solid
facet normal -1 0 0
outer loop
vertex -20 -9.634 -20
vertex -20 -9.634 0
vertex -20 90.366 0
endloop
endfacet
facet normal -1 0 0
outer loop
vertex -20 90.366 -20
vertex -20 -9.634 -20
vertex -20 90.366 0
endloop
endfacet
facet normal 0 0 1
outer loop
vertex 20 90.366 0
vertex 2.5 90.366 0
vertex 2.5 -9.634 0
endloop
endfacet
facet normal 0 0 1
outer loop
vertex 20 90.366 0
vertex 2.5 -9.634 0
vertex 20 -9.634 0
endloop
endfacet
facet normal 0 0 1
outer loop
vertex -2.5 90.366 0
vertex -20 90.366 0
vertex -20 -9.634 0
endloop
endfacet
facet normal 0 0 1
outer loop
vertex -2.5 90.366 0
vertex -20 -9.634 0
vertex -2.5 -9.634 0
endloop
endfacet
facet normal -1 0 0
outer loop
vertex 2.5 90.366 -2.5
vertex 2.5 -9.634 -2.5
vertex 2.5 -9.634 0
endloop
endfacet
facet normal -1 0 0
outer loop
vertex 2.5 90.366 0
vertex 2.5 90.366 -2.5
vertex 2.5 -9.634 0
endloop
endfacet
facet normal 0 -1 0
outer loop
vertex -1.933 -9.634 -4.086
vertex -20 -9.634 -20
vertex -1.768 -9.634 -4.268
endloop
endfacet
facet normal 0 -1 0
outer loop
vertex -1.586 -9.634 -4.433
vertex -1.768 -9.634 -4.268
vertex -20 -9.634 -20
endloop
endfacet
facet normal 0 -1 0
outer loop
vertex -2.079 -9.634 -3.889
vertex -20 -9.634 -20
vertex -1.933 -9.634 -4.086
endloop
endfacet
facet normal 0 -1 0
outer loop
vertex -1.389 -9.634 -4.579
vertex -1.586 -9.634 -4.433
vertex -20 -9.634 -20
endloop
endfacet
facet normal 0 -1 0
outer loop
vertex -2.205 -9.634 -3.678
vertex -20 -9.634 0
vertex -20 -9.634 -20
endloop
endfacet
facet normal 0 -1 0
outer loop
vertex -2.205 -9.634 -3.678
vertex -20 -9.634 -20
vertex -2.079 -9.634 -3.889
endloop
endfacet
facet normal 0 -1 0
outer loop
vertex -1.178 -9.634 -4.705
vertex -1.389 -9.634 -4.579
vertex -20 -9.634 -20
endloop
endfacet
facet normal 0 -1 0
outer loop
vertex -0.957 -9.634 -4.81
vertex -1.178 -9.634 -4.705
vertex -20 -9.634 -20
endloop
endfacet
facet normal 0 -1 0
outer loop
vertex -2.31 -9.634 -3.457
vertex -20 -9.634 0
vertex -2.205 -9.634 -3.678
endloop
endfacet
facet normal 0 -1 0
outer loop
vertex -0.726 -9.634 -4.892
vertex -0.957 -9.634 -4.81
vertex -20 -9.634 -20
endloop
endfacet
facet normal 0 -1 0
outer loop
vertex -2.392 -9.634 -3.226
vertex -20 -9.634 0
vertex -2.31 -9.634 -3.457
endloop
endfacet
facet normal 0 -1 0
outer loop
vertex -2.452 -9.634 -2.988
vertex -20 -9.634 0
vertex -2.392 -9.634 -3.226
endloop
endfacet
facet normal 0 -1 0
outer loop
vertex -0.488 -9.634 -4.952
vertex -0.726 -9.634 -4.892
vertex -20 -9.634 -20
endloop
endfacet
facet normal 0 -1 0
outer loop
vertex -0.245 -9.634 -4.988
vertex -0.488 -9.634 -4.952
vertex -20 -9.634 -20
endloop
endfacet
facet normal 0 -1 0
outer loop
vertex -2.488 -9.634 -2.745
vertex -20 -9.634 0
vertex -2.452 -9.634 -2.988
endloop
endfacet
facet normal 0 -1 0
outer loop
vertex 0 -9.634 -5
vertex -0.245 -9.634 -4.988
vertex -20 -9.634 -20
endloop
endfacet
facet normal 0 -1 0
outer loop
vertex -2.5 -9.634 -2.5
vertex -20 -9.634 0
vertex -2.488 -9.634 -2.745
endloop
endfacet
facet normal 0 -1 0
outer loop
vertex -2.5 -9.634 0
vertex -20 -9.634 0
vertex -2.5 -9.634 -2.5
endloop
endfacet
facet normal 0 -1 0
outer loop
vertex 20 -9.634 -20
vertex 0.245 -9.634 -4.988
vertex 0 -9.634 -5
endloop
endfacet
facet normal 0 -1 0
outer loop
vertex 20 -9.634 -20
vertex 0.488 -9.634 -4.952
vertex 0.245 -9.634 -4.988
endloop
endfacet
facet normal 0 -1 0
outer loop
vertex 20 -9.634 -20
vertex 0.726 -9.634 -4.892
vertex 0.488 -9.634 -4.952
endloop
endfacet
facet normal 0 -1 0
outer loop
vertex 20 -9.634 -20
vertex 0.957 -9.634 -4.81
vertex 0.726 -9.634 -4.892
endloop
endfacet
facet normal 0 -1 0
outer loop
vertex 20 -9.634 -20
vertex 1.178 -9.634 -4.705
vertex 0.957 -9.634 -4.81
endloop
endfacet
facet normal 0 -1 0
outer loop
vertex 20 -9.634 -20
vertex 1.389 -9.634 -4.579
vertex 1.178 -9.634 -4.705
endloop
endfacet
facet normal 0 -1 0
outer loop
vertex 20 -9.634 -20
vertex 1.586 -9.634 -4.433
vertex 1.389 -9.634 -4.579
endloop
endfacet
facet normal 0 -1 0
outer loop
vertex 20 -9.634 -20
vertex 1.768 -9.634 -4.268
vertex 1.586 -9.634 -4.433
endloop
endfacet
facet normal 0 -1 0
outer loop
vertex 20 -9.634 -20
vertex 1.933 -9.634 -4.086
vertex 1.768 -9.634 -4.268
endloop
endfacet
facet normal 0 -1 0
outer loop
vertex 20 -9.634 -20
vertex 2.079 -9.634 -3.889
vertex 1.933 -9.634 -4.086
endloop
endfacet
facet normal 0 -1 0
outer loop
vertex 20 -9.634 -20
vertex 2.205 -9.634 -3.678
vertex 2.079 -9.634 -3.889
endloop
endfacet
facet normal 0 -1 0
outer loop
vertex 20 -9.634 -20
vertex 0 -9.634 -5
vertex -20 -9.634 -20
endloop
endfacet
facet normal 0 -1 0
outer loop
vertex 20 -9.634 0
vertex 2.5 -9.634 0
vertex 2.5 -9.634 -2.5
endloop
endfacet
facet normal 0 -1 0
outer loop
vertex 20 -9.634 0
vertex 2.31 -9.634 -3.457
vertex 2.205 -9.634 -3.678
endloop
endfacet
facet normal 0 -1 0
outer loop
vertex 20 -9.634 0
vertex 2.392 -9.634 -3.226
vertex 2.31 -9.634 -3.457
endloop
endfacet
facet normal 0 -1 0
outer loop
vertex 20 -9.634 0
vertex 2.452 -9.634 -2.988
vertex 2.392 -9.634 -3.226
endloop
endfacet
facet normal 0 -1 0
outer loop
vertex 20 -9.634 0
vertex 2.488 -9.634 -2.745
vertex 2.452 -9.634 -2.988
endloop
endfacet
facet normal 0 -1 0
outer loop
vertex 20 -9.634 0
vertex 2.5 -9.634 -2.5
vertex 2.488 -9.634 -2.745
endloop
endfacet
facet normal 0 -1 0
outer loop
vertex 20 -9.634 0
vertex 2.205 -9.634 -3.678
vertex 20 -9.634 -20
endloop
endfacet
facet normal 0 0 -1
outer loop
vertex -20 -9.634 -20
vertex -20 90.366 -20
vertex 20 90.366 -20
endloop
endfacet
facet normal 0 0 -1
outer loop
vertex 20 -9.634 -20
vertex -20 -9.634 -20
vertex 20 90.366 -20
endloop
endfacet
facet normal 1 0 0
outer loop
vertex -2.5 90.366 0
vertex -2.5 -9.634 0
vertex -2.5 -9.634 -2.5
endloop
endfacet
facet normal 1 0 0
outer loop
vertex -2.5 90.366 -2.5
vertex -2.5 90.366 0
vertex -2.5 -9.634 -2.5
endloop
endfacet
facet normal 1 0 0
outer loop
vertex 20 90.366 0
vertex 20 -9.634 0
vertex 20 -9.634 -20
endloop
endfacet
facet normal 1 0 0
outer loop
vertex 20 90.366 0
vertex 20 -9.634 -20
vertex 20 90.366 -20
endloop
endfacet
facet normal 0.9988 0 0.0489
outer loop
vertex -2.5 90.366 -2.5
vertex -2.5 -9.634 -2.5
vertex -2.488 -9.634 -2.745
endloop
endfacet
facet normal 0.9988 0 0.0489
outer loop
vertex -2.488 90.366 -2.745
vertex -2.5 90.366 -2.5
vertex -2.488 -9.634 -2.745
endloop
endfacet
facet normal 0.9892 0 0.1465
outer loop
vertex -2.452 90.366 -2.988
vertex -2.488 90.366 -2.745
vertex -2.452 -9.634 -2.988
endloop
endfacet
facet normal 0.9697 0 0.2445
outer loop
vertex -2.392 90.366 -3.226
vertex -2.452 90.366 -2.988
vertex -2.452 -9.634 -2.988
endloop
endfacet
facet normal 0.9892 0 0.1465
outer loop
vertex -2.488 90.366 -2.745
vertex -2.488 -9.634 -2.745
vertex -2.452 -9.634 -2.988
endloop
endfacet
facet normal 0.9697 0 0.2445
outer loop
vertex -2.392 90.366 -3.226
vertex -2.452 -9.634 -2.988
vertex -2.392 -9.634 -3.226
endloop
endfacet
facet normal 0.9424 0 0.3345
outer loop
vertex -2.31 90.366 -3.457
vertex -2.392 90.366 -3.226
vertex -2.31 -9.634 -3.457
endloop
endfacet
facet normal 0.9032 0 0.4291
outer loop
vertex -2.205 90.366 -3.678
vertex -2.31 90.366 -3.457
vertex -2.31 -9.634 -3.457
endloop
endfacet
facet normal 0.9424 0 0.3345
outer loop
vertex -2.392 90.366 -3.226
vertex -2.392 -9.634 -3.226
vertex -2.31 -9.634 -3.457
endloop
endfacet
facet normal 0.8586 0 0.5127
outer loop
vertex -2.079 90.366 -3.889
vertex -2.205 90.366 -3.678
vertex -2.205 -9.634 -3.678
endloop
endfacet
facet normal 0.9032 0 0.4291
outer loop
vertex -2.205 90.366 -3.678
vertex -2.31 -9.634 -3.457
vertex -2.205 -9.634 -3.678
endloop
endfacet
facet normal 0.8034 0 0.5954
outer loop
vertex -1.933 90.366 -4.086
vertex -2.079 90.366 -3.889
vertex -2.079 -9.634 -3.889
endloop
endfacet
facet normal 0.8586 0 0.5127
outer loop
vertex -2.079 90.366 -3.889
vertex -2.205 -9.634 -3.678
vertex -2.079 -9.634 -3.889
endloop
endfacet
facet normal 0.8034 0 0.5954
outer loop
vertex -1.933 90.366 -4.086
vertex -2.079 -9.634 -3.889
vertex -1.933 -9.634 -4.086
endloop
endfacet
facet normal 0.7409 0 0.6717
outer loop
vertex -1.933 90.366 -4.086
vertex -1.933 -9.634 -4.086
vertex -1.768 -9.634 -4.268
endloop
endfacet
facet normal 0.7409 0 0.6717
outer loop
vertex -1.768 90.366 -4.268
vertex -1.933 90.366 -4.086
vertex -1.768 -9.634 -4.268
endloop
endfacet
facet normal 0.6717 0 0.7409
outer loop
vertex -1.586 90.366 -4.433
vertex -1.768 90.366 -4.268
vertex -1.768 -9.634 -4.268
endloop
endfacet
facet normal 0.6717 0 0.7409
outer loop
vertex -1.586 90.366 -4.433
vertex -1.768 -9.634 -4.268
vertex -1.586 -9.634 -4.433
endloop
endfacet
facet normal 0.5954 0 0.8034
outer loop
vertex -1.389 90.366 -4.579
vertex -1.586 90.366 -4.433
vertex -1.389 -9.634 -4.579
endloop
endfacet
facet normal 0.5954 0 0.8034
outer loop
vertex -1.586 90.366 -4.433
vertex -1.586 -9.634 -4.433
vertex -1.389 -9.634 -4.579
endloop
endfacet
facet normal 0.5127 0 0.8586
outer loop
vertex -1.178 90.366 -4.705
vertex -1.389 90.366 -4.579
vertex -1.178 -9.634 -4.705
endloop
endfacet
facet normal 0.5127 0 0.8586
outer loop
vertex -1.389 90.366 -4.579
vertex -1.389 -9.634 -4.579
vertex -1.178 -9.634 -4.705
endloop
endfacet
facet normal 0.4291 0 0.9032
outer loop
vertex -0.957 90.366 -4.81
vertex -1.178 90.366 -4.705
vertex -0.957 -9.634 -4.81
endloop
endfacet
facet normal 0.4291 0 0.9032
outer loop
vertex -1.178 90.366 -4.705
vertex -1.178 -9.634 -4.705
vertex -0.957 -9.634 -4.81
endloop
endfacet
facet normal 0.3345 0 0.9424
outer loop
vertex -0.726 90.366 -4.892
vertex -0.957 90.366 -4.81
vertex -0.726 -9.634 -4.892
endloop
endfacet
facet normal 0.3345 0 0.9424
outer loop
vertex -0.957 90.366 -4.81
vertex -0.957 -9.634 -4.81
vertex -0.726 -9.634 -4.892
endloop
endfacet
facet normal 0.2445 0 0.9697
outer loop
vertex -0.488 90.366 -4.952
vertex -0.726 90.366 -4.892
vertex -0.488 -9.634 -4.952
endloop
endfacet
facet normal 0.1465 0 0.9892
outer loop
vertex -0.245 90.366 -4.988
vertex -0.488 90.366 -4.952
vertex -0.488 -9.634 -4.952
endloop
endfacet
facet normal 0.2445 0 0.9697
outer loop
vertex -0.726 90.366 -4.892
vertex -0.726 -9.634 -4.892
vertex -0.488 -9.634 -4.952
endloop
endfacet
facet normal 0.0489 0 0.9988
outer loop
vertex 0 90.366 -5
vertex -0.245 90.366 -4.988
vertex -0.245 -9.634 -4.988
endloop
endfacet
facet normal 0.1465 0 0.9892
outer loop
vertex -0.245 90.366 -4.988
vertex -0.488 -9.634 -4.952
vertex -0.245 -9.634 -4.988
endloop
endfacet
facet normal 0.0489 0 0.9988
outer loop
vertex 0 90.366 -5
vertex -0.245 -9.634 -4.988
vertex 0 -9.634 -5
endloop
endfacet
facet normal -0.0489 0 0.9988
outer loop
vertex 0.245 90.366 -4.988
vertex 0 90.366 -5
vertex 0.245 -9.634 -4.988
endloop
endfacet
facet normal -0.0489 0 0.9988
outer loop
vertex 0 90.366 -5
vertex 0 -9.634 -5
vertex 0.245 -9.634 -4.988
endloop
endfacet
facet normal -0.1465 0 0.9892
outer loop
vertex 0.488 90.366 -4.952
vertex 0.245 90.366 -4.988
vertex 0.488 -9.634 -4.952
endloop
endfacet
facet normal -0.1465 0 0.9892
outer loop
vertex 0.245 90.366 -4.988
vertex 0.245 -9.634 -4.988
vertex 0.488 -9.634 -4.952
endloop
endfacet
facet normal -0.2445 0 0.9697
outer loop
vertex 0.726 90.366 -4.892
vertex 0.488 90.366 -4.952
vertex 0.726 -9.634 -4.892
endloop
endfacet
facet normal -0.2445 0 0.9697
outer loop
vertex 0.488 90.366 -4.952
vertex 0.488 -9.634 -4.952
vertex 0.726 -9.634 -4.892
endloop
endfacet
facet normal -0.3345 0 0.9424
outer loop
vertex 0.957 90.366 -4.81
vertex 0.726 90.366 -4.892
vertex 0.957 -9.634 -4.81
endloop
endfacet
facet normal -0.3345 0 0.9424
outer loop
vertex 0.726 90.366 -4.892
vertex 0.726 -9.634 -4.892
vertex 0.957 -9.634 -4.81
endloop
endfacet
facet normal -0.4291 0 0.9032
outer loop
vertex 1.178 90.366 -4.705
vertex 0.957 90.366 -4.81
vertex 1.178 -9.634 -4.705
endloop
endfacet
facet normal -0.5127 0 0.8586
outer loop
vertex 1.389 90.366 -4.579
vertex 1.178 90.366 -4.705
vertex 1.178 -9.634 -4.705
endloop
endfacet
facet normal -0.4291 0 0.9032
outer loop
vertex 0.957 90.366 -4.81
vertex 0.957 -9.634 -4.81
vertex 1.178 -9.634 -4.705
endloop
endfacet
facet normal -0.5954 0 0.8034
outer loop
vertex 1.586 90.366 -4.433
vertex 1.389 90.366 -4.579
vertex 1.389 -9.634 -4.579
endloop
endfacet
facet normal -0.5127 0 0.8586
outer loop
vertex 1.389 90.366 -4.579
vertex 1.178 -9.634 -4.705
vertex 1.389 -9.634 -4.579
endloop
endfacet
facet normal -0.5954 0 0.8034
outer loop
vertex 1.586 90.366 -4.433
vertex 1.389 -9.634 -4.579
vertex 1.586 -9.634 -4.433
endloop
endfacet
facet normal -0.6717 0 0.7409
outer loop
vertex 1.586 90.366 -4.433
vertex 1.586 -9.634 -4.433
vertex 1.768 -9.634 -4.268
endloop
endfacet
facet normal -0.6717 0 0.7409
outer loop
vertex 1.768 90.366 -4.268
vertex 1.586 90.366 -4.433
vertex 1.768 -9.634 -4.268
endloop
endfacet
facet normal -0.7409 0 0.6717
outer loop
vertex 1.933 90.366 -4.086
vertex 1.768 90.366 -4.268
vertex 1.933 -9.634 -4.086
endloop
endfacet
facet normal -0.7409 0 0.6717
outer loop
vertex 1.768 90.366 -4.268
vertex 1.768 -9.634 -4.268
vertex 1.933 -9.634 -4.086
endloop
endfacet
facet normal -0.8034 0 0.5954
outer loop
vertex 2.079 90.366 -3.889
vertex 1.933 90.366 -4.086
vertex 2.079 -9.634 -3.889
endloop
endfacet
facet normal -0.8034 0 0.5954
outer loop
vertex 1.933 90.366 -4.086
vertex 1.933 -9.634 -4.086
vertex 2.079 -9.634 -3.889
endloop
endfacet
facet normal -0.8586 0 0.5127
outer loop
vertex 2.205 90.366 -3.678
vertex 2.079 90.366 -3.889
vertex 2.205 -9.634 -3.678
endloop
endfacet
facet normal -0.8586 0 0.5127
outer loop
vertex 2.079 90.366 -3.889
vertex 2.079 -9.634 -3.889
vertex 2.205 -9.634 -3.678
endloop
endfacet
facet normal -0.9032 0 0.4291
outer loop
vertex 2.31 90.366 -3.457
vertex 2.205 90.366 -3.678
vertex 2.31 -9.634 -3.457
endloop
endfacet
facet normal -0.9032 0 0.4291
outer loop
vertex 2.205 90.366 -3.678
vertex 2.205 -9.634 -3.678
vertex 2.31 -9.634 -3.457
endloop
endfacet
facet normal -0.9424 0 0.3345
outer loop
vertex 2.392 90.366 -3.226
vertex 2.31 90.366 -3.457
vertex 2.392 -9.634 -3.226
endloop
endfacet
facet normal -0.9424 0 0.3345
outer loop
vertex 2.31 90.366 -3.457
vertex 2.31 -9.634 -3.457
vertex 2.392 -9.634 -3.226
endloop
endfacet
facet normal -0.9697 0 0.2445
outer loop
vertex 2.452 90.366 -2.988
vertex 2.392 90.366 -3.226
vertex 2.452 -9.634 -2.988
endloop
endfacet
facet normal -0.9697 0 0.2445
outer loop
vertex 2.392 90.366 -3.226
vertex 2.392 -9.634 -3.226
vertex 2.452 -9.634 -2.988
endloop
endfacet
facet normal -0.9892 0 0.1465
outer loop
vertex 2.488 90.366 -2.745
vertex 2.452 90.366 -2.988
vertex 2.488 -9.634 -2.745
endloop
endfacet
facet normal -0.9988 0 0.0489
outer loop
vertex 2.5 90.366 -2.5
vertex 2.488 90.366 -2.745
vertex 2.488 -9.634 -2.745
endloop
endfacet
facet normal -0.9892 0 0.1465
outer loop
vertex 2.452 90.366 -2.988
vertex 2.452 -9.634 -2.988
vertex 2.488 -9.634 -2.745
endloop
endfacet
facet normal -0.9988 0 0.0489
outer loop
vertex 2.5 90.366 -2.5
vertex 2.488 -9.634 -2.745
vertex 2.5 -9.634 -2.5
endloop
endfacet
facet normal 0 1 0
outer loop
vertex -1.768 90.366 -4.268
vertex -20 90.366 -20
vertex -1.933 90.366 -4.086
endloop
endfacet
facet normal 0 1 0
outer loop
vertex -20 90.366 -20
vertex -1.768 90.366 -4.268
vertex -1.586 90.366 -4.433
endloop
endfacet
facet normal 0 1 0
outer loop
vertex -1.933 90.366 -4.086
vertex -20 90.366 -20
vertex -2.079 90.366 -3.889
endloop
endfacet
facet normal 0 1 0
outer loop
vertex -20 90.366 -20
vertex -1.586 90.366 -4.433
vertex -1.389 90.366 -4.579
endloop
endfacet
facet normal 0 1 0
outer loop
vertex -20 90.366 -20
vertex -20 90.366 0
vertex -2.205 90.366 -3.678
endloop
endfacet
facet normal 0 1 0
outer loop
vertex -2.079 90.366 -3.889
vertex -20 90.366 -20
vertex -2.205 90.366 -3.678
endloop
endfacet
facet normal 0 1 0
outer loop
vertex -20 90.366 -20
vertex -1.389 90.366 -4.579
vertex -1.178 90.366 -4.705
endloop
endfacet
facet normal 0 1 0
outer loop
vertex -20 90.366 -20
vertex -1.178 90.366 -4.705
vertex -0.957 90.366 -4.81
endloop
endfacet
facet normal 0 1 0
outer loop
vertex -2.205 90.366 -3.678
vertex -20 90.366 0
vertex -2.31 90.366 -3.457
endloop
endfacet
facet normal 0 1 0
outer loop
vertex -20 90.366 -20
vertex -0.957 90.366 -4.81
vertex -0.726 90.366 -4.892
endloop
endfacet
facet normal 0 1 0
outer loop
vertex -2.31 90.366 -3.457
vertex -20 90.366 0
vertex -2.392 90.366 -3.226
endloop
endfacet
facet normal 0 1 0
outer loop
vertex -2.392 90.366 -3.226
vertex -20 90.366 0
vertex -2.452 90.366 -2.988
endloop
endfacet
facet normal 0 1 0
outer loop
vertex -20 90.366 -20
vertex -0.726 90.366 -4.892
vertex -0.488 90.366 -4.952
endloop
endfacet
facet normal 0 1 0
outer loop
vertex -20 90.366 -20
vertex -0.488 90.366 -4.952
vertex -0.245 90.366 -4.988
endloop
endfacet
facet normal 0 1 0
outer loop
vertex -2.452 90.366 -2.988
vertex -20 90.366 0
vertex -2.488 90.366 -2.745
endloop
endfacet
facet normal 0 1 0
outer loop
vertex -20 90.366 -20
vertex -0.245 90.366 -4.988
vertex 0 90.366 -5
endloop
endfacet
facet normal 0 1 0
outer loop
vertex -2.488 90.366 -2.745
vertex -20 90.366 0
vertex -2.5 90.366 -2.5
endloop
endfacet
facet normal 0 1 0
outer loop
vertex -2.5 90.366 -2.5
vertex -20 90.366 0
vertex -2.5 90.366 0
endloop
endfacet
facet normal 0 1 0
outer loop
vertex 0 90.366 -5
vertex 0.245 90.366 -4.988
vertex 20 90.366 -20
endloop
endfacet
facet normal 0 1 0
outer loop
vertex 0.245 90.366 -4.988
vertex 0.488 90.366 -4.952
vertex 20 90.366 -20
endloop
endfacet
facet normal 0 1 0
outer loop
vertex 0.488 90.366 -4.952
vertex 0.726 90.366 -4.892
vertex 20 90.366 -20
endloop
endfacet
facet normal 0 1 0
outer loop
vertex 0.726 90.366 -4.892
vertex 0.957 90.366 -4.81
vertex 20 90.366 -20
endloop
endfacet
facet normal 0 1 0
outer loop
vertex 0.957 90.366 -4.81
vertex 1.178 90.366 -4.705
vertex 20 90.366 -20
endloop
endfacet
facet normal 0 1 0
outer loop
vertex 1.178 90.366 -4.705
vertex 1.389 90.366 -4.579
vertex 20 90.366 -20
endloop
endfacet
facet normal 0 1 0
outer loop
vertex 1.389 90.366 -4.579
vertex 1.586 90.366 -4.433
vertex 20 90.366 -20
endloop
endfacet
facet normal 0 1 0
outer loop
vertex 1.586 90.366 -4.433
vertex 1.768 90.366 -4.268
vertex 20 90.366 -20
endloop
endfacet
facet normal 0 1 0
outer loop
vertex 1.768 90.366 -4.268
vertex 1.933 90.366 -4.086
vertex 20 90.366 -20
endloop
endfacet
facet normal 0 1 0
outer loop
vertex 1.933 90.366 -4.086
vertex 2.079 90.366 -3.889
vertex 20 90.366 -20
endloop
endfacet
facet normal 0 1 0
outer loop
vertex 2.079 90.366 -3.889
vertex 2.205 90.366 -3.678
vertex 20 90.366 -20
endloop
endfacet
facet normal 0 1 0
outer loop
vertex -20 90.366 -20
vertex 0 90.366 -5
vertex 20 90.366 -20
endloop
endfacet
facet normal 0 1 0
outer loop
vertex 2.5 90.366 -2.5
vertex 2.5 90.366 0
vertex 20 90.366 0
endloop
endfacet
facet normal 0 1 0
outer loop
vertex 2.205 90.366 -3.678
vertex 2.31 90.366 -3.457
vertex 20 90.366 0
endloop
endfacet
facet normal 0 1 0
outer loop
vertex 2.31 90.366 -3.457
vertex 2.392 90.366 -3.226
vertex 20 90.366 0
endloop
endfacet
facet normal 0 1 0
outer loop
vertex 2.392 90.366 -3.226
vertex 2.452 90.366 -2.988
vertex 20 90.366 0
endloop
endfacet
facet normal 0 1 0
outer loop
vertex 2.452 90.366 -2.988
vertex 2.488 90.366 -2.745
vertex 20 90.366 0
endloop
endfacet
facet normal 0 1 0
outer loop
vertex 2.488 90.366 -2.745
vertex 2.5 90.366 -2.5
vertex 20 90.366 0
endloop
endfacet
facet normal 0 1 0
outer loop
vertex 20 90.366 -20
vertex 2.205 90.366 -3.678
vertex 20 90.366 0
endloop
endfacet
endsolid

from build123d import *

# Parameters (mm, degrees)
F0_W     = 40
F0_H     = 100
F1_DEPTH = 20
F3_DEPTH = 100


with BuildPart() as f1:
    # F0 (on Top) → F1 (new body)
    with BuildSketch(Plane.XY):
        with Locations((0, 40.365882)):
            Rectangle(F0_W, F0_H)
    extrude(amount=-F1_DEPTH)

    # F2 (on face) → F3 (cut, through all)
    with BuildSketch(Plane.XZ.offset(9.634118)):
        with BuildLine():
            ThreePointArc((-2.5, -2.5), (0, -5), (2.5, -2.5))
            ThreePointArc((2.5, -2.5), (0, 0), (-2.5, -2.5))
        make_face()
        with BuildLine():
            ThreePointArc((0, 0), (1.767767, -0.732233), (2.5, -2.5))
            Line((2.5, -2.5), (2.5, 0))
            Line((2.5, 0), (0, 0))
        make_face()
        with BuildLine():
            Line((-2.5, 0), (-2.5, -2.5))
            ThreePointArc((-2.5, -2.5), (-1.767767, -0.732233), (0, 0))
            Line((0, 0), (-2.5, 0))
        make_face()
    extrude(amount=-F3_DEPTH, mode=Mode.SUBTRACT)


solid = f1.part
